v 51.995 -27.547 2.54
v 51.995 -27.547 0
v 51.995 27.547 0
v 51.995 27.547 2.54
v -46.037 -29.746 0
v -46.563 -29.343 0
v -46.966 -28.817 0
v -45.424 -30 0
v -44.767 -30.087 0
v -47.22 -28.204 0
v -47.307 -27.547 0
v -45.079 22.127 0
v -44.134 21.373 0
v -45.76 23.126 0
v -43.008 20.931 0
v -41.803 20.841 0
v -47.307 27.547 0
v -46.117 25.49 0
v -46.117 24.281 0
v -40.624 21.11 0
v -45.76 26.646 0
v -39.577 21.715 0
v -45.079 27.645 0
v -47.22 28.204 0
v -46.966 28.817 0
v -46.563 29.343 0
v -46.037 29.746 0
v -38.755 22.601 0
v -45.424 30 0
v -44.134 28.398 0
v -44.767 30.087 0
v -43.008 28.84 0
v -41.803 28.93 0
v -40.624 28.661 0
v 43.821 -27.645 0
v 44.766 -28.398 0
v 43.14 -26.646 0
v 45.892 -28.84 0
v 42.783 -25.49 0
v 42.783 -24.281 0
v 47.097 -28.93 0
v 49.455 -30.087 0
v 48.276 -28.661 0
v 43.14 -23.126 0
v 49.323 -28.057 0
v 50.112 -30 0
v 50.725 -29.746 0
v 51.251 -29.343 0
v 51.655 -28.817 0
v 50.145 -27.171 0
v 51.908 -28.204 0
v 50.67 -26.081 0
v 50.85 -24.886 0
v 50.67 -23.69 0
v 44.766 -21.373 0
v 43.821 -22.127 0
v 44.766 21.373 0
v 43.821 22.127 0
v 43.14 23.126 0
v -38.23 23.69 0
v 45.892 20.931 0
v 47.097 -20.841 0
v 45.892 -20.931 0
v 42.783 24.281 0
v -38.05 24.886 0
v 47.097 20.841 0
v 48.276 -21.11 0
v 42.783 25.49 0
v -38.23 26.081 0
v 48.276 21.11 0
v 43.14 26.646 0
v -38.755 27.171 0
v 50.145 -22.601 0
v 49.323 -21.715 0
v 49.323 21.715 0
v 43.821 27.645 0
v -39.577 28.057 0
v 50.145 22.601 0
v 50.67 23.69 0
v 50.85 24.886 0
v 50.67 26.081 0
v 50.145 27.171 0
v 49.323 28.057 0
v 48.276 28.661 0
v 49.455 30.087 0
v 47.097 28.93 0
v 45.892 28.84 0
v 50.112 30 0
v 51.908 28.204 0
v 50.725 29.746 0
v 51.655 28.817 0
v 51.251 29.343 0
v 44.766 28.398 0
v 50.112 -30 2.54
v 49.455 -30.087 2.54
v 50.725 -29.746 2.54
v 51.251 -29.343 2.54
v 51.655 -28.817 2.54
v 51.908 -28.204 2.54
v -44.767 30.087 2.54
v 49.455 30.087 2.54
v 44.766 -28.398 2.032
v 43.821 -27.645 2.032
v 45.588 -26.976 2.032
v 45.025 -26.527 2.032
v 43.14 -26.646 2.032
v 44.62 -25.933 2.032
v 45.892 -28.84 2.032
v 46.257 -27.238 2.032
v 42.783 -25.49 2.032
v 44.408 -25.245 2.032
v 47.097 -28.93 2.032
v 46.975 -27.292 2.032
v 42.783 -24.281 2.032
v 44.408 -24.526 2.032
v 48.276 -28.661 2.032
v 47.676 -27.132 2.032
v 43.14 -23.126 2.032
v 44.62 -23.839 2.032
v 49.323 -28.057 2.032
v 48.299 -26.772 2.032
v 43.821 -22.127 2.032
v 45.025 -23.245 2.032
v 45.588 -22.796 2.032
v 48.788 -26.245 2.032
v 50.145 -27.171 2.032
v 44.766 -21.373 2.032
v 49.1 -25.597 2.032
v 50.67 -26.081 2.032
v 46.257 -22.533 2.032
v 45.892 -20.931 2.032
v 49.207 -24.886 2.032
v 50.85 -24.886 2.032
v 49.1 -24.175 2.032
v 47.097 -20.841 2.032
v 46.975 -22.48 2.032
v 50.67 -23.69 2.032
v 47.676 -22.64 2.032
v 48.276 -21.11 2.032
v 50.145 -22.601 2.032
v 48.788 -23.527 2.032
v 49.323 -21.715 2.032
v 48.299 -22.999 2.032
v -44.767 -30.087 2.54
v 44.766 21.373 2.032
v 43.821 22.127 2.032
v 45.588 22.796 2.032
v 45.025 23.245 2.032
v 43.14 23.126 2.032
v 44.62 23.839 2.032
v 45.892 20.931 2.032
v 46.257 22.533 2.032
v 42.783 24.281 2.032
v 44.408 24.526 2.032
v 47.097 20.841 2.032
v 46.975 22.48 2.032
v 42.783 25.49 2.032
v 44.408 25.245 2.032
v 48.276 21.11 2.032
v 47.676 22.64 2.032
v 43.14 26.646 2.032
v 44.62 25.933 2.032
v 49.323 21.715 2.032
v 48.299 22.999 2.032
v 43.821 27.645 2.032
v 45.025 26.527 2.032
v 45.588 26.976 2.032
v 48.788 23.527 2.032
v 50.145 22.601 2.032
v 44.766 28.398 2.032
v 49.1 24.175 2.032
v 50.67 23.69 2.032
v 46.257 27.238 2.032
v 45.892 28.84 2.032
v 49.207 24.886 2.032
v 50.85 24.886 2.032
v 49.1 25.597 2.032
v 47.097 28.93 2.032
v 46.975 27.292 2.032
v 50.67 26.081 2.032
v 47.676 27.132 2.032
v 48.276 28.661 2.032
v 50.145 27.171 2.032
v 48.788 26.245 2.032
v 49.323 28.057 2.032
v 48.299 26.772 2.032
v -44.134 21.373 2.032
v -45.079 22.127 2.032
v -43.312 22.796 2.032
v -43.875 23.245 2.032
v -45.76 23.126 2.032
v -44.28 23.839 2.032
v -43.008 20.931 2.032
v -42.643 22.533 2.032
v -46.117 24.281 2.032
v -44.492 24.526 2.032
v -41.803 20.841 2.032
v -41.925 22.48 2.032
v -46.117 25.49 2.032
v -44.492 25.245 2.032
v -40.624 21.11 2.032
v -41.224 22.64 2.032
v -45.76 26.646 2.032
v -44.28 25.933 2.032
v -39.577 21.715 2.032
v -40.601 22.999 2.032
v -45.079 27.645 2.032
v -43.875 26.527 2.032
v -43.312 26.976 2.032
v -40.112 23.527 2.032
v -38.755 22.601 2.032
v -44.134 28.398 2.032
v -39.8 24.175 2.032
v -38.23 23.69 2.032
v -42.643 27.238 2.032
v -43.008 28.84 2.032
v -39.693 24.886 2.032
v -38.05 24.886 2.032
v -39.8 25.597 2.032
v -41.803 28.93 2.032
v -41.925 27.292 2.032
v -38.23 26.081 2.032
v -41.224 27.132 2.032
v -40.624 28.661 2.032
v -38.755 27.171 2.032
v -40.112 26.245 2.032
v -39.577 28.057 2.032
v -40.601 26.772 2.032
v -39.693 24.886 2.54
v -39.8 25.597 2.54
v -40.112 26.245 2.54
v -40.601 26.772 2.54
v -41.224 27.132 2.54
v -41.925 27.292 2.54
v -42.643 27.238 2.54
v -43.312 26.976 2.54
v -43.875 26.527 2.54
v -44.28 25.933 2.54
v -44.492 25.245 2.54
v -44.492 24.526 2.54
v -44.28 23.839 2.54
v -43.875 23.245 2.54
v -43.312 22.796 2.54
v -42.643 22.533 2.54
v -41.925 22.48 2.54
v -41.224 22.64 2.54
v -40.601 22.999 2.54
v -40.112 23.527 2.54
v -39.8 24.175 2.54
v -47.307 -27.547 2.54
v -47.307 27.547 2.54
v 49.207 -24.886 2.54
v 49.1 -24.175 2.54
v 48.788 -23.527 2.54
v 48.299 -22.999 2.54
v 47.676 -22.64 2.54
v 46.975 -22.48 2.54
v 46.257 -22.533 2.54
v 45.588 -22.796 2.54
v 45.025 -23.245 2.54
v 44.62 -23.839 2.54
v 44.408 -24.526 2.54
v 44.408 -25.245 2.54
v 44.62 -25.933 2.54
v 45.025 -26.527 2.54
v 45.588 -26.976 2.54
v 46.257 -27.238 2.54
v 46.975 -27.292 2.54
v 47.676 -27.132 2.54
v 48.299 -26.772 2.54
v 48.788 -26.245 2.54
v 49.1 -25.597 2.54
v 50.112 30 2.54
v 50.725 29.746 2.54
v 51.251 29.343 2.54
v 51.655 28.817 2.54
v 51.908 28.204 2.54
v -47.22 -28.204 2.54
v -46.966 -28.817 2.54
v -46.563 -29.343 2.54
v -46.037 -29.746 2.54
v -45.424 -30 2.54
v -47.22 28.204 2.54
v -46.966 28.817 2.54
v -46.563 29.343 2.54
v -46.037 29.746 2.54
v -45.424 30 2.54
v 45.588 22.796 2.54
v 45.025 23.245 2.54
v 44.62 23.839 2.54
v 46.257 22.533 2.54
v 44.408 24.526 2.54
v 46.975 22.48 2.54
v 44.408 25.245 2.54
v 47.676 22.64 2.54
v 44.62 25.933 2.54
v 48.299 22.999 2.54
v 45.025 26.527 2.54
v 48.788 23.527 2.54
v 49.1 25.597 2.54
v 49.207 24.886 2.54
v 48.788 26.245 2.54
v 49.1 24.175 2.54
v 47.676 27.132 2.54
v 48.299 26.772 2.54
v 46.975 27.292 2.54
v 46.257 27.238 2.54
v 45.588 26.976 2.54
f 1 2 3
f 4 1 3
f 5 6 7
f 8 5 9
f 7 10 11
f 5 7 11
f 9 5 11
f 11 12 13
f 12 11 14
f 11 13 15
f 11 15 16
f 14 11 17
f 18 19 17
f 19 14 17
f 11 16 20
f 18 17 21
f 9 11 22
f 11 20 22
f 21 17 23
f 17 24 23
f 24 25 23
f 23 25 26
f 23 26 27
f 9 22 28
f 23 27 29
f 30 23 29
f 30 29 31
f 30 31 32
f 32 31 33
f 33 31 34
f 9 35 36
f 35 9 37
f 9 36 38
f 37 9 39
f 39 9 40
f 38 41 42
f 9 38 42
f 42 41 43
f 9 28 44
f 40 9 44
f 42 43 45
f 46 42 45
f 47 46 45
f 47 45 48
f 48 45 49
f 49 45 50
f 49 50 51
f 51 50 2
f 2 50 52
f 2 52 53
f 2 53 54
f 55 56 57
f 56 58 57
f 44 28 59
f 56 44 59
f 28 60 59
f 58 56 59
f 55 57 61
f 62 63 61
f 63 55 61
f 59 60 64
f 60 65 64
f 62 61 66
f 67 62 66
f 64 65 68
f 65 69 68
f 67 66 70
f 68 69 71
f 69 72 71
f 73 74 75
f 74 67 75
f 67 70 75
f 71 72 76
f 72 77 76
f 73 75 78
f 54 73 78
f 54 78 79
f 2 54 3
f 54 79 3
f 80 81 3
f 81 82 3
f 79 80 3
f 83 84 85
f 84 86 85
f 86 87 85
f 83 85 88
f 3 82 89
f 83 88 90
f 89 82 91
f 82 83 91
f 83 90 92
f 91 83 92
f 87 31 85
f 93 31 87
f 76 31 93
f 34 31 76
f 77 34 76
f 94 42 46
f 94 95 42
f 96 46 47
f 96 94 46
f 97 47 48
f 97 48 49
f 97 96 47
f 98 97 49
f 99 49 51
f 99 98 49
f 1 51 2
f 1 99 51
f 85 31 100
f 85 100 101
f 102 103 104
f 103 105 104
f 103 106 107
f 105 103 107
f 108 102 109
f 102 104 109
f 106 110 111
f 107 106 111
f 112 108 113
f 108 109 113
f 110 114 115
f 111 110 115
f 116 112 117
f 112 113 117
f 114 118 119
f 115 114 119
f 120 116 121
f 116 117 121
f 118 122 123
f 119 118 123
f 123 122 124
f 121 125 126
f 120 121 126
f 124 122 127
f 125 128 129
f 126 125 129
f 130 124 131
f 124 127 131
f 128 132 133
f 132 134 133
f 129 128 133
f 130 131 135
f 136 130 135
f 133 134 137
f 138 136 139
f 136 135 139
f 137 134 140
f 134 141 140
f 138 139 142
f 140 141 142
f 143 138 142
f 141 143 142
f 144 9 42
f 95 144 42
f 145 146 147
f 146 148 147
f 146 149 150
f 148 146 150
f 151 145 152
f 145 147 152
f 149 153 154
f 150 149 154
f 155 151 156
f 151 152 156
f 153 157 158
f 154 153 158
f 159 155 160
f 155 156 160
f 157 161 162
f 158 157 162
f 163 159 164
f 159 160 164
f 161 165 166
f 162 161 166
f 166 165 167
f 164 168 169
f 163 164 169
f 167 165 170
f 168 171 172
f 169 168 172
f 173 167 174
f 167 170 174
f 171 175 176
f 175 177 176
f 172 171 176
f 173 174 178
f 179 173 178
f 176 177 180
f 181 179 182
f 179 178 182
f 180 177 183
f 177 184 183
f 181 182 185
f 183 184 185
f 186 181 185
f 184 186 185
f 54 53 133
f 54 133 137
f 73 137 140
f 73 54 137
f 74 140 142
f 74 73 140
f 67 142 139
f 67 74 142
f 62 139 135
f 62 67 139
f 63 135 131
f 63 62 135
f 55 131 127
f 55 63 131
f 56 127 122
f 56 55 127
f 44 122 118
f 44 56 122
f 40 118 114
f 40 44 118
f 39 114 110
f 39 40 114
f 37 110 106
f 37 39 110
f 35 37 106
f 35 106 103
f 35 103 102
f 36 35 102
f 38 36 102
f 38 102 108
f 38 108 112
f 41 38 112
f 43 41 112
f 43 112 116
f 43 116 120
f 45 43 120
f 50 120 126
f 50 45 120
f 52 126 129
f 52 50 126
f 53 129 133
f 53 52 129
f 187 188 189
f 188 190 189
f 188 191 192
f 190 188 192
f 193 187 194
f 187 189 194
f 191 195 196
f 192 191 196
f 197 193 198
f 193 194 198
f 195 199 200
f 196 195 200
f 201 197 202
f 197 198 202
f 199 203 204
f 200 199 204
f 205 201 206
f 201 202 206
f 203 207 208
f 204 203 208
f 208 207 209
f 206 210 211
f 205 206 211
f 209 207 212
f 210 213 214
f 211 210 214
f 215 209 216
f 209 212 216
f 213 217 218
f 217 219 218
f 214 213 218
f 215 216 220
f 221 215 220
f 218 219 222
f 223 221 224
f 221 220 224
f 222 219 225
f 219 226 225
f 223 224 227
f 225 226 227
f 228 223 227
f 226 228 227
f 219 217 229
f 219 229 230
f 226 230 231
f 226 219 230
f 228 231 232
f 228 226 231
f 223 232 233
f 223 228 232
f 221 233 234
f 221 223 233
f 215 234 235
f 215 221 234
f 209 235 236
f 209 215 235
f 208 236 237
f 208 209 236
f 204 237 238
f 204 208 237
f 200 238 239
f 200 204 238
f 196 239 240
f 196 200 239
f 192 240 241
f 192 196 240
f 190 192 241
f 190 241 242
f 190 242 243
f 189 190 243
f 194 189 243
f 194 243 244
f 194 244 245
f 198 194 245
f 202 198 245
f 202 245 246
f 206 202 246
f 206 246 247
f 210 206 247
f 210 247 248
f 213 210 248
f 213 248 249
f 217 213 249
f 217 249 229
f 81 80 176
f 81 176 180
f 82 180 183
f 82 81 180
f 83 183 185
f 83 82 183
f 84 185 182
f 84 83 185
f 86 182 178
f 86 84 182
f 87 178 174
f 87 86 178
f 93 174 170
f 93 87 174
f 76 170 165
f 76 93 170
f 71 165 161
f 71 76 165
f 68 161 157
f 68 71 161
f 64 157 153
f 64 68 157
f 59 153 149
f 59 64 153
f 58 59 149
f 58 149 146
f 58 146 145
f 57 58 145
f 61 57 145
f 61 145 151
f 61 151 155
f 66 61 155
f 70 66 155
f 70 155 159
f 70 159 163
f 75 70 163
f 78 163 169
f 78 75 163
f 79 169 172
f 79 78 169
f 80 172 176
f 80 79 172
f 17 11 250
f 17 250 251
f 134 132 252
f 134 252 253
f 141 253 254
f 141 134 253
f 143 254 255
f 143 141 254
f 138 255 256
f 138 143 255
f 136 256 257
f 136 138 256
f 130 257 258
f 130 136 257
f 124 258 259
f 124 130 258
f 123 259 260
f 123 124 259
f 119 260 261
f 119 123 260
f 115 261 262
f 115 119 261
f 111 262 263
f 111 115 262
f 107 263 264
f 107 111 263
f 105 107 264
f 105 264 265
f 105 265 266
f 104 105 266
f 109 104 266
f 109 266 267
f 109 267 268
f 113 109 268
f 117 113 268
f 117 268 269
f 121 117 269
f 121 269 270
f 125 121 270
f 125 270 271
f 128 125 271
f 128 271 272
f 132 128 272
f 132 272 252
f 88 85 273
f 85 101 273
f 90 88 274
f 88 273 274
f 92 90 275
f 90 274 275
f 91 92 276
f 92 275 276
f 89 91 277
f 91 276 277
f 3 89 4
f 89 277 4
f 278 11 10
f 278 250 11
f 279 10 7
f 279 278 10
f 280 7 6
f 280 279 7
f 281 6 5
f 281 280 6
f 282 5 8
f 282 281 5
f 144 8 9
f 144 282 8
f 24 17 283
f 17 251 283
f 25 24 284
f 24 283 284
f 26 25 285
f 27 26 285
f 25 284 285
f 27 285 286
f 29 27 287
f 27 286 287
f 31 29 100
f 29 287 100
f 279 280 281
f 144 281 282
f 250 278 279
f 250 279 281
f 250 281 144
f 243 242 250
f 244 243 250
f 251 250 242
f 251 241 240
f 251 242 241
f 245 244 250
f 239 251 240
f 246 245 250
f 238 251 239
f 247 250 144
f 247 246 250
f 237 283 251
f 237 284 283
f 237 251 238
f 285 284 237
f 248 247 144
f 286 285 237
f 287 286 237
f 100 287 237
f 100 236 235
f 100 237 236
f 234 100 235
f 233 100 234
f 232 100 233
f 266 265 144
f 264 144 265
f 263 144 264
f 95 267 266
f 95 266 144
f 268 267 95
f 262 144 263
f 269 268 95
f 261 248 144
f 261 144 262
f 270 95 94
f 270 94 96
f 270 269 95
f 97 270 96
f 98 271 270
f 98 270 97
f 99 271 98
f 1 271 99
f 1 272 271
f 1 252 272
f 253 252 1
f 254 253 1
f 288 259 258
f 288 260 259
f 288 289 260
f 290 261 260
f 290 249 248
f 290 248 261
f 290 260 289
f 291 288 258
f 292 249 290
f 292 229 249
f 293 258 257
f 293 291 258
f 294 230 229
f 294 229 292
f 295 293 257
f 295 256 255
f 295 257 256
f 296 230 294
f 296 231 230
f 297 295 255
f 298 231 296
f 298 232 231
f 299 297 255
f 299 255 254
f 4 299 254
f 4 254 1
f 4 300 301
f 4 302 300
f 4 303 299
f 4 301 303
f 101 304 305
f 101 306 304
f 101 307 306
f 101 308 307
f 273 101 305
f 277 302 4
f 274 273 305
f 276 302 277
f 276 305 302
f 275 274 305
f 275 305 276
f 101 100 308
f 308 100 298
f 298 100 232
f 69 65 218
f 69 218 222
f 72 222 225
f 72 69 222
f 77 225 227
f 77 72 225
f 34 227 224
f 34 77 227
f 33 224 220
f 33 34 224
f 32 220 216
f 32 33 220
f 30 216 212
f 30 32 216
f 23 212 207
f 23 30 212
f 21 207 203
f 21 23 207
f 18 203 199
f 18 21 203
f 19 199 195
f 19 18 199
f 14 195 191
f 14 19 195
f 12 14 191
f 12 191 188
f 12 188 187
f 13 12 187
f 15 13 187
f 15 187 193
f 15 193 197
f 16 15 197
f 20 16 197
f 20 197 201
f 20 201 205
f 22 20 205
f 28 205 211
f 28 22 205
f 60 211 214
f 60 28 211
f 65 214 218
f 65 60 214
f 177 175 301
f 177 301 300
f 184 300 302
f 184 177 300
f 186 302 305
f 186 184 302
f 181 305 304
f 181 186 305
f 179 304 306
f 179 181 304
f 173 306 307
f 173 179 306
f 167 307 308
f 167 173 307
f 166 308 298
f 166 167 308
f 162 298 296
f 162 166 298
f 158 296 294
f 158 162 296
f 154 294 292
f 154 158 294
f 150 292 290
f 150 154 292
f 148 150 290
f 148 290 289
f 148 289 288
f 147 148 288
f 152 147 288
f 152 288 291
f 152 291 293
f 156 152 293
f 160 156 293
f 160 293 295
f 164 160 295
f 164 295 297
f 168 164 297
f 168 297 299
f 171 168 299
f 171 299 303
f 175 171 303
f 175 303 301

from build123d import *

# Parameters (mm, degrees)
SKETCH1_W           = 99.30160125
SKETCH1_H           = 60.173202502
SKETCH1_R           = 2.413
BOSS_EXTRUDE1_DEPTH = 2.54
SKETCH1_3_R         = 2.413
CUT_EXTRUDE1_DEPTH  = 2.54
SKETCH1_4_R         = 4.056034091
SKETCH1_4_R_2       = 2.413
CUT_EXTRUDE2_DEPTH  = 2.032
FILLET1_R           = 2.54


with BuildPart() as part:
    # Sketch1 → Boss-Extrude1 (new body)
    with BuildSketch(Plane.XY):
        with Locations((2.344221604, 0)):
            Rectangle(SKETCH1_W, SKETCH1_H)
        with Locations((46.794221604, -24.885800625)):
            Circle(SKETCH1_R, mode=Mode.SUBTRACT)
    extrude(amount=BOSS_EXTRUDE1_DEPTH)

    # Sketch1<3> → Cut-Extrude1 (cut)
    with BuildSketch(Plane.XY):
        with Locations((-42.105778396, 24.885800625)):
            Circle(SKETCH1_3_R)
        with Locations((46.794221604, 24.885800625)):
            Circle(SKETCH1_3_R)
        with Locations((46.794221604, -24.885800625)):
            Circle(SKETCH1_3_R)
    extrude(amount=CUT_EXTRUDE1_DEPTH, mode=Mode.SUBTRACT)

    # Sketch1<4> → Cut-Extrude2 (cut)
    # profile 1 of 3: a face of its own
    with BuildSketch(Plane.XY):
        with Locations((-42.105778396, 24.885800625)):
            Circle(SKETCH1_4_R)
        with Locations((-42.105778396, 24.885800625)):
            Circle(SKETCH1_4_R_2, mode=Mode.SUBTRACT)
    # profile 2 of 3: a face of its own
    with BuildSketch(Plane.XY):
        with Locations((46.794221604, 24.885800625)):
            Circle(SKETCH1_4_R)
        with Locations((46.794221604, 24.885800625)):
            Circle(SKETCH1_4_R_2, mode=Mode.SUBTRACT)
    # profile 3 of 3: a face of its own
    with BuildSketch(Plane.XY):
        with Locations((46.794221604, -24.885800625)):
            Circle(SKETCH1_4_R)
        with Locations((46.794221604, -24.885800625)):
            Circle(SKETCH1_4_R_2, mode=Mode.SUBTRACT)
    extrude(amount=CUT_EXTRUDE2_DEPTH, mode=Mode.SUBTRACT)

    # Fillet1
    fillet1_edges = [part.edges().sort_by_distance(p)[0] for p in [
        (-47.306579021, 30.086601251, 1.27),
        (-47.306579021, -30.086601251, 1.27),
        (51.995022229, -30.086601251, 1.27),
        (51.995022229, 30.086601251, 1.27),
    ]]
    fillet(fillet1_edges, radius=FILLET1_R)


solid = part.part
